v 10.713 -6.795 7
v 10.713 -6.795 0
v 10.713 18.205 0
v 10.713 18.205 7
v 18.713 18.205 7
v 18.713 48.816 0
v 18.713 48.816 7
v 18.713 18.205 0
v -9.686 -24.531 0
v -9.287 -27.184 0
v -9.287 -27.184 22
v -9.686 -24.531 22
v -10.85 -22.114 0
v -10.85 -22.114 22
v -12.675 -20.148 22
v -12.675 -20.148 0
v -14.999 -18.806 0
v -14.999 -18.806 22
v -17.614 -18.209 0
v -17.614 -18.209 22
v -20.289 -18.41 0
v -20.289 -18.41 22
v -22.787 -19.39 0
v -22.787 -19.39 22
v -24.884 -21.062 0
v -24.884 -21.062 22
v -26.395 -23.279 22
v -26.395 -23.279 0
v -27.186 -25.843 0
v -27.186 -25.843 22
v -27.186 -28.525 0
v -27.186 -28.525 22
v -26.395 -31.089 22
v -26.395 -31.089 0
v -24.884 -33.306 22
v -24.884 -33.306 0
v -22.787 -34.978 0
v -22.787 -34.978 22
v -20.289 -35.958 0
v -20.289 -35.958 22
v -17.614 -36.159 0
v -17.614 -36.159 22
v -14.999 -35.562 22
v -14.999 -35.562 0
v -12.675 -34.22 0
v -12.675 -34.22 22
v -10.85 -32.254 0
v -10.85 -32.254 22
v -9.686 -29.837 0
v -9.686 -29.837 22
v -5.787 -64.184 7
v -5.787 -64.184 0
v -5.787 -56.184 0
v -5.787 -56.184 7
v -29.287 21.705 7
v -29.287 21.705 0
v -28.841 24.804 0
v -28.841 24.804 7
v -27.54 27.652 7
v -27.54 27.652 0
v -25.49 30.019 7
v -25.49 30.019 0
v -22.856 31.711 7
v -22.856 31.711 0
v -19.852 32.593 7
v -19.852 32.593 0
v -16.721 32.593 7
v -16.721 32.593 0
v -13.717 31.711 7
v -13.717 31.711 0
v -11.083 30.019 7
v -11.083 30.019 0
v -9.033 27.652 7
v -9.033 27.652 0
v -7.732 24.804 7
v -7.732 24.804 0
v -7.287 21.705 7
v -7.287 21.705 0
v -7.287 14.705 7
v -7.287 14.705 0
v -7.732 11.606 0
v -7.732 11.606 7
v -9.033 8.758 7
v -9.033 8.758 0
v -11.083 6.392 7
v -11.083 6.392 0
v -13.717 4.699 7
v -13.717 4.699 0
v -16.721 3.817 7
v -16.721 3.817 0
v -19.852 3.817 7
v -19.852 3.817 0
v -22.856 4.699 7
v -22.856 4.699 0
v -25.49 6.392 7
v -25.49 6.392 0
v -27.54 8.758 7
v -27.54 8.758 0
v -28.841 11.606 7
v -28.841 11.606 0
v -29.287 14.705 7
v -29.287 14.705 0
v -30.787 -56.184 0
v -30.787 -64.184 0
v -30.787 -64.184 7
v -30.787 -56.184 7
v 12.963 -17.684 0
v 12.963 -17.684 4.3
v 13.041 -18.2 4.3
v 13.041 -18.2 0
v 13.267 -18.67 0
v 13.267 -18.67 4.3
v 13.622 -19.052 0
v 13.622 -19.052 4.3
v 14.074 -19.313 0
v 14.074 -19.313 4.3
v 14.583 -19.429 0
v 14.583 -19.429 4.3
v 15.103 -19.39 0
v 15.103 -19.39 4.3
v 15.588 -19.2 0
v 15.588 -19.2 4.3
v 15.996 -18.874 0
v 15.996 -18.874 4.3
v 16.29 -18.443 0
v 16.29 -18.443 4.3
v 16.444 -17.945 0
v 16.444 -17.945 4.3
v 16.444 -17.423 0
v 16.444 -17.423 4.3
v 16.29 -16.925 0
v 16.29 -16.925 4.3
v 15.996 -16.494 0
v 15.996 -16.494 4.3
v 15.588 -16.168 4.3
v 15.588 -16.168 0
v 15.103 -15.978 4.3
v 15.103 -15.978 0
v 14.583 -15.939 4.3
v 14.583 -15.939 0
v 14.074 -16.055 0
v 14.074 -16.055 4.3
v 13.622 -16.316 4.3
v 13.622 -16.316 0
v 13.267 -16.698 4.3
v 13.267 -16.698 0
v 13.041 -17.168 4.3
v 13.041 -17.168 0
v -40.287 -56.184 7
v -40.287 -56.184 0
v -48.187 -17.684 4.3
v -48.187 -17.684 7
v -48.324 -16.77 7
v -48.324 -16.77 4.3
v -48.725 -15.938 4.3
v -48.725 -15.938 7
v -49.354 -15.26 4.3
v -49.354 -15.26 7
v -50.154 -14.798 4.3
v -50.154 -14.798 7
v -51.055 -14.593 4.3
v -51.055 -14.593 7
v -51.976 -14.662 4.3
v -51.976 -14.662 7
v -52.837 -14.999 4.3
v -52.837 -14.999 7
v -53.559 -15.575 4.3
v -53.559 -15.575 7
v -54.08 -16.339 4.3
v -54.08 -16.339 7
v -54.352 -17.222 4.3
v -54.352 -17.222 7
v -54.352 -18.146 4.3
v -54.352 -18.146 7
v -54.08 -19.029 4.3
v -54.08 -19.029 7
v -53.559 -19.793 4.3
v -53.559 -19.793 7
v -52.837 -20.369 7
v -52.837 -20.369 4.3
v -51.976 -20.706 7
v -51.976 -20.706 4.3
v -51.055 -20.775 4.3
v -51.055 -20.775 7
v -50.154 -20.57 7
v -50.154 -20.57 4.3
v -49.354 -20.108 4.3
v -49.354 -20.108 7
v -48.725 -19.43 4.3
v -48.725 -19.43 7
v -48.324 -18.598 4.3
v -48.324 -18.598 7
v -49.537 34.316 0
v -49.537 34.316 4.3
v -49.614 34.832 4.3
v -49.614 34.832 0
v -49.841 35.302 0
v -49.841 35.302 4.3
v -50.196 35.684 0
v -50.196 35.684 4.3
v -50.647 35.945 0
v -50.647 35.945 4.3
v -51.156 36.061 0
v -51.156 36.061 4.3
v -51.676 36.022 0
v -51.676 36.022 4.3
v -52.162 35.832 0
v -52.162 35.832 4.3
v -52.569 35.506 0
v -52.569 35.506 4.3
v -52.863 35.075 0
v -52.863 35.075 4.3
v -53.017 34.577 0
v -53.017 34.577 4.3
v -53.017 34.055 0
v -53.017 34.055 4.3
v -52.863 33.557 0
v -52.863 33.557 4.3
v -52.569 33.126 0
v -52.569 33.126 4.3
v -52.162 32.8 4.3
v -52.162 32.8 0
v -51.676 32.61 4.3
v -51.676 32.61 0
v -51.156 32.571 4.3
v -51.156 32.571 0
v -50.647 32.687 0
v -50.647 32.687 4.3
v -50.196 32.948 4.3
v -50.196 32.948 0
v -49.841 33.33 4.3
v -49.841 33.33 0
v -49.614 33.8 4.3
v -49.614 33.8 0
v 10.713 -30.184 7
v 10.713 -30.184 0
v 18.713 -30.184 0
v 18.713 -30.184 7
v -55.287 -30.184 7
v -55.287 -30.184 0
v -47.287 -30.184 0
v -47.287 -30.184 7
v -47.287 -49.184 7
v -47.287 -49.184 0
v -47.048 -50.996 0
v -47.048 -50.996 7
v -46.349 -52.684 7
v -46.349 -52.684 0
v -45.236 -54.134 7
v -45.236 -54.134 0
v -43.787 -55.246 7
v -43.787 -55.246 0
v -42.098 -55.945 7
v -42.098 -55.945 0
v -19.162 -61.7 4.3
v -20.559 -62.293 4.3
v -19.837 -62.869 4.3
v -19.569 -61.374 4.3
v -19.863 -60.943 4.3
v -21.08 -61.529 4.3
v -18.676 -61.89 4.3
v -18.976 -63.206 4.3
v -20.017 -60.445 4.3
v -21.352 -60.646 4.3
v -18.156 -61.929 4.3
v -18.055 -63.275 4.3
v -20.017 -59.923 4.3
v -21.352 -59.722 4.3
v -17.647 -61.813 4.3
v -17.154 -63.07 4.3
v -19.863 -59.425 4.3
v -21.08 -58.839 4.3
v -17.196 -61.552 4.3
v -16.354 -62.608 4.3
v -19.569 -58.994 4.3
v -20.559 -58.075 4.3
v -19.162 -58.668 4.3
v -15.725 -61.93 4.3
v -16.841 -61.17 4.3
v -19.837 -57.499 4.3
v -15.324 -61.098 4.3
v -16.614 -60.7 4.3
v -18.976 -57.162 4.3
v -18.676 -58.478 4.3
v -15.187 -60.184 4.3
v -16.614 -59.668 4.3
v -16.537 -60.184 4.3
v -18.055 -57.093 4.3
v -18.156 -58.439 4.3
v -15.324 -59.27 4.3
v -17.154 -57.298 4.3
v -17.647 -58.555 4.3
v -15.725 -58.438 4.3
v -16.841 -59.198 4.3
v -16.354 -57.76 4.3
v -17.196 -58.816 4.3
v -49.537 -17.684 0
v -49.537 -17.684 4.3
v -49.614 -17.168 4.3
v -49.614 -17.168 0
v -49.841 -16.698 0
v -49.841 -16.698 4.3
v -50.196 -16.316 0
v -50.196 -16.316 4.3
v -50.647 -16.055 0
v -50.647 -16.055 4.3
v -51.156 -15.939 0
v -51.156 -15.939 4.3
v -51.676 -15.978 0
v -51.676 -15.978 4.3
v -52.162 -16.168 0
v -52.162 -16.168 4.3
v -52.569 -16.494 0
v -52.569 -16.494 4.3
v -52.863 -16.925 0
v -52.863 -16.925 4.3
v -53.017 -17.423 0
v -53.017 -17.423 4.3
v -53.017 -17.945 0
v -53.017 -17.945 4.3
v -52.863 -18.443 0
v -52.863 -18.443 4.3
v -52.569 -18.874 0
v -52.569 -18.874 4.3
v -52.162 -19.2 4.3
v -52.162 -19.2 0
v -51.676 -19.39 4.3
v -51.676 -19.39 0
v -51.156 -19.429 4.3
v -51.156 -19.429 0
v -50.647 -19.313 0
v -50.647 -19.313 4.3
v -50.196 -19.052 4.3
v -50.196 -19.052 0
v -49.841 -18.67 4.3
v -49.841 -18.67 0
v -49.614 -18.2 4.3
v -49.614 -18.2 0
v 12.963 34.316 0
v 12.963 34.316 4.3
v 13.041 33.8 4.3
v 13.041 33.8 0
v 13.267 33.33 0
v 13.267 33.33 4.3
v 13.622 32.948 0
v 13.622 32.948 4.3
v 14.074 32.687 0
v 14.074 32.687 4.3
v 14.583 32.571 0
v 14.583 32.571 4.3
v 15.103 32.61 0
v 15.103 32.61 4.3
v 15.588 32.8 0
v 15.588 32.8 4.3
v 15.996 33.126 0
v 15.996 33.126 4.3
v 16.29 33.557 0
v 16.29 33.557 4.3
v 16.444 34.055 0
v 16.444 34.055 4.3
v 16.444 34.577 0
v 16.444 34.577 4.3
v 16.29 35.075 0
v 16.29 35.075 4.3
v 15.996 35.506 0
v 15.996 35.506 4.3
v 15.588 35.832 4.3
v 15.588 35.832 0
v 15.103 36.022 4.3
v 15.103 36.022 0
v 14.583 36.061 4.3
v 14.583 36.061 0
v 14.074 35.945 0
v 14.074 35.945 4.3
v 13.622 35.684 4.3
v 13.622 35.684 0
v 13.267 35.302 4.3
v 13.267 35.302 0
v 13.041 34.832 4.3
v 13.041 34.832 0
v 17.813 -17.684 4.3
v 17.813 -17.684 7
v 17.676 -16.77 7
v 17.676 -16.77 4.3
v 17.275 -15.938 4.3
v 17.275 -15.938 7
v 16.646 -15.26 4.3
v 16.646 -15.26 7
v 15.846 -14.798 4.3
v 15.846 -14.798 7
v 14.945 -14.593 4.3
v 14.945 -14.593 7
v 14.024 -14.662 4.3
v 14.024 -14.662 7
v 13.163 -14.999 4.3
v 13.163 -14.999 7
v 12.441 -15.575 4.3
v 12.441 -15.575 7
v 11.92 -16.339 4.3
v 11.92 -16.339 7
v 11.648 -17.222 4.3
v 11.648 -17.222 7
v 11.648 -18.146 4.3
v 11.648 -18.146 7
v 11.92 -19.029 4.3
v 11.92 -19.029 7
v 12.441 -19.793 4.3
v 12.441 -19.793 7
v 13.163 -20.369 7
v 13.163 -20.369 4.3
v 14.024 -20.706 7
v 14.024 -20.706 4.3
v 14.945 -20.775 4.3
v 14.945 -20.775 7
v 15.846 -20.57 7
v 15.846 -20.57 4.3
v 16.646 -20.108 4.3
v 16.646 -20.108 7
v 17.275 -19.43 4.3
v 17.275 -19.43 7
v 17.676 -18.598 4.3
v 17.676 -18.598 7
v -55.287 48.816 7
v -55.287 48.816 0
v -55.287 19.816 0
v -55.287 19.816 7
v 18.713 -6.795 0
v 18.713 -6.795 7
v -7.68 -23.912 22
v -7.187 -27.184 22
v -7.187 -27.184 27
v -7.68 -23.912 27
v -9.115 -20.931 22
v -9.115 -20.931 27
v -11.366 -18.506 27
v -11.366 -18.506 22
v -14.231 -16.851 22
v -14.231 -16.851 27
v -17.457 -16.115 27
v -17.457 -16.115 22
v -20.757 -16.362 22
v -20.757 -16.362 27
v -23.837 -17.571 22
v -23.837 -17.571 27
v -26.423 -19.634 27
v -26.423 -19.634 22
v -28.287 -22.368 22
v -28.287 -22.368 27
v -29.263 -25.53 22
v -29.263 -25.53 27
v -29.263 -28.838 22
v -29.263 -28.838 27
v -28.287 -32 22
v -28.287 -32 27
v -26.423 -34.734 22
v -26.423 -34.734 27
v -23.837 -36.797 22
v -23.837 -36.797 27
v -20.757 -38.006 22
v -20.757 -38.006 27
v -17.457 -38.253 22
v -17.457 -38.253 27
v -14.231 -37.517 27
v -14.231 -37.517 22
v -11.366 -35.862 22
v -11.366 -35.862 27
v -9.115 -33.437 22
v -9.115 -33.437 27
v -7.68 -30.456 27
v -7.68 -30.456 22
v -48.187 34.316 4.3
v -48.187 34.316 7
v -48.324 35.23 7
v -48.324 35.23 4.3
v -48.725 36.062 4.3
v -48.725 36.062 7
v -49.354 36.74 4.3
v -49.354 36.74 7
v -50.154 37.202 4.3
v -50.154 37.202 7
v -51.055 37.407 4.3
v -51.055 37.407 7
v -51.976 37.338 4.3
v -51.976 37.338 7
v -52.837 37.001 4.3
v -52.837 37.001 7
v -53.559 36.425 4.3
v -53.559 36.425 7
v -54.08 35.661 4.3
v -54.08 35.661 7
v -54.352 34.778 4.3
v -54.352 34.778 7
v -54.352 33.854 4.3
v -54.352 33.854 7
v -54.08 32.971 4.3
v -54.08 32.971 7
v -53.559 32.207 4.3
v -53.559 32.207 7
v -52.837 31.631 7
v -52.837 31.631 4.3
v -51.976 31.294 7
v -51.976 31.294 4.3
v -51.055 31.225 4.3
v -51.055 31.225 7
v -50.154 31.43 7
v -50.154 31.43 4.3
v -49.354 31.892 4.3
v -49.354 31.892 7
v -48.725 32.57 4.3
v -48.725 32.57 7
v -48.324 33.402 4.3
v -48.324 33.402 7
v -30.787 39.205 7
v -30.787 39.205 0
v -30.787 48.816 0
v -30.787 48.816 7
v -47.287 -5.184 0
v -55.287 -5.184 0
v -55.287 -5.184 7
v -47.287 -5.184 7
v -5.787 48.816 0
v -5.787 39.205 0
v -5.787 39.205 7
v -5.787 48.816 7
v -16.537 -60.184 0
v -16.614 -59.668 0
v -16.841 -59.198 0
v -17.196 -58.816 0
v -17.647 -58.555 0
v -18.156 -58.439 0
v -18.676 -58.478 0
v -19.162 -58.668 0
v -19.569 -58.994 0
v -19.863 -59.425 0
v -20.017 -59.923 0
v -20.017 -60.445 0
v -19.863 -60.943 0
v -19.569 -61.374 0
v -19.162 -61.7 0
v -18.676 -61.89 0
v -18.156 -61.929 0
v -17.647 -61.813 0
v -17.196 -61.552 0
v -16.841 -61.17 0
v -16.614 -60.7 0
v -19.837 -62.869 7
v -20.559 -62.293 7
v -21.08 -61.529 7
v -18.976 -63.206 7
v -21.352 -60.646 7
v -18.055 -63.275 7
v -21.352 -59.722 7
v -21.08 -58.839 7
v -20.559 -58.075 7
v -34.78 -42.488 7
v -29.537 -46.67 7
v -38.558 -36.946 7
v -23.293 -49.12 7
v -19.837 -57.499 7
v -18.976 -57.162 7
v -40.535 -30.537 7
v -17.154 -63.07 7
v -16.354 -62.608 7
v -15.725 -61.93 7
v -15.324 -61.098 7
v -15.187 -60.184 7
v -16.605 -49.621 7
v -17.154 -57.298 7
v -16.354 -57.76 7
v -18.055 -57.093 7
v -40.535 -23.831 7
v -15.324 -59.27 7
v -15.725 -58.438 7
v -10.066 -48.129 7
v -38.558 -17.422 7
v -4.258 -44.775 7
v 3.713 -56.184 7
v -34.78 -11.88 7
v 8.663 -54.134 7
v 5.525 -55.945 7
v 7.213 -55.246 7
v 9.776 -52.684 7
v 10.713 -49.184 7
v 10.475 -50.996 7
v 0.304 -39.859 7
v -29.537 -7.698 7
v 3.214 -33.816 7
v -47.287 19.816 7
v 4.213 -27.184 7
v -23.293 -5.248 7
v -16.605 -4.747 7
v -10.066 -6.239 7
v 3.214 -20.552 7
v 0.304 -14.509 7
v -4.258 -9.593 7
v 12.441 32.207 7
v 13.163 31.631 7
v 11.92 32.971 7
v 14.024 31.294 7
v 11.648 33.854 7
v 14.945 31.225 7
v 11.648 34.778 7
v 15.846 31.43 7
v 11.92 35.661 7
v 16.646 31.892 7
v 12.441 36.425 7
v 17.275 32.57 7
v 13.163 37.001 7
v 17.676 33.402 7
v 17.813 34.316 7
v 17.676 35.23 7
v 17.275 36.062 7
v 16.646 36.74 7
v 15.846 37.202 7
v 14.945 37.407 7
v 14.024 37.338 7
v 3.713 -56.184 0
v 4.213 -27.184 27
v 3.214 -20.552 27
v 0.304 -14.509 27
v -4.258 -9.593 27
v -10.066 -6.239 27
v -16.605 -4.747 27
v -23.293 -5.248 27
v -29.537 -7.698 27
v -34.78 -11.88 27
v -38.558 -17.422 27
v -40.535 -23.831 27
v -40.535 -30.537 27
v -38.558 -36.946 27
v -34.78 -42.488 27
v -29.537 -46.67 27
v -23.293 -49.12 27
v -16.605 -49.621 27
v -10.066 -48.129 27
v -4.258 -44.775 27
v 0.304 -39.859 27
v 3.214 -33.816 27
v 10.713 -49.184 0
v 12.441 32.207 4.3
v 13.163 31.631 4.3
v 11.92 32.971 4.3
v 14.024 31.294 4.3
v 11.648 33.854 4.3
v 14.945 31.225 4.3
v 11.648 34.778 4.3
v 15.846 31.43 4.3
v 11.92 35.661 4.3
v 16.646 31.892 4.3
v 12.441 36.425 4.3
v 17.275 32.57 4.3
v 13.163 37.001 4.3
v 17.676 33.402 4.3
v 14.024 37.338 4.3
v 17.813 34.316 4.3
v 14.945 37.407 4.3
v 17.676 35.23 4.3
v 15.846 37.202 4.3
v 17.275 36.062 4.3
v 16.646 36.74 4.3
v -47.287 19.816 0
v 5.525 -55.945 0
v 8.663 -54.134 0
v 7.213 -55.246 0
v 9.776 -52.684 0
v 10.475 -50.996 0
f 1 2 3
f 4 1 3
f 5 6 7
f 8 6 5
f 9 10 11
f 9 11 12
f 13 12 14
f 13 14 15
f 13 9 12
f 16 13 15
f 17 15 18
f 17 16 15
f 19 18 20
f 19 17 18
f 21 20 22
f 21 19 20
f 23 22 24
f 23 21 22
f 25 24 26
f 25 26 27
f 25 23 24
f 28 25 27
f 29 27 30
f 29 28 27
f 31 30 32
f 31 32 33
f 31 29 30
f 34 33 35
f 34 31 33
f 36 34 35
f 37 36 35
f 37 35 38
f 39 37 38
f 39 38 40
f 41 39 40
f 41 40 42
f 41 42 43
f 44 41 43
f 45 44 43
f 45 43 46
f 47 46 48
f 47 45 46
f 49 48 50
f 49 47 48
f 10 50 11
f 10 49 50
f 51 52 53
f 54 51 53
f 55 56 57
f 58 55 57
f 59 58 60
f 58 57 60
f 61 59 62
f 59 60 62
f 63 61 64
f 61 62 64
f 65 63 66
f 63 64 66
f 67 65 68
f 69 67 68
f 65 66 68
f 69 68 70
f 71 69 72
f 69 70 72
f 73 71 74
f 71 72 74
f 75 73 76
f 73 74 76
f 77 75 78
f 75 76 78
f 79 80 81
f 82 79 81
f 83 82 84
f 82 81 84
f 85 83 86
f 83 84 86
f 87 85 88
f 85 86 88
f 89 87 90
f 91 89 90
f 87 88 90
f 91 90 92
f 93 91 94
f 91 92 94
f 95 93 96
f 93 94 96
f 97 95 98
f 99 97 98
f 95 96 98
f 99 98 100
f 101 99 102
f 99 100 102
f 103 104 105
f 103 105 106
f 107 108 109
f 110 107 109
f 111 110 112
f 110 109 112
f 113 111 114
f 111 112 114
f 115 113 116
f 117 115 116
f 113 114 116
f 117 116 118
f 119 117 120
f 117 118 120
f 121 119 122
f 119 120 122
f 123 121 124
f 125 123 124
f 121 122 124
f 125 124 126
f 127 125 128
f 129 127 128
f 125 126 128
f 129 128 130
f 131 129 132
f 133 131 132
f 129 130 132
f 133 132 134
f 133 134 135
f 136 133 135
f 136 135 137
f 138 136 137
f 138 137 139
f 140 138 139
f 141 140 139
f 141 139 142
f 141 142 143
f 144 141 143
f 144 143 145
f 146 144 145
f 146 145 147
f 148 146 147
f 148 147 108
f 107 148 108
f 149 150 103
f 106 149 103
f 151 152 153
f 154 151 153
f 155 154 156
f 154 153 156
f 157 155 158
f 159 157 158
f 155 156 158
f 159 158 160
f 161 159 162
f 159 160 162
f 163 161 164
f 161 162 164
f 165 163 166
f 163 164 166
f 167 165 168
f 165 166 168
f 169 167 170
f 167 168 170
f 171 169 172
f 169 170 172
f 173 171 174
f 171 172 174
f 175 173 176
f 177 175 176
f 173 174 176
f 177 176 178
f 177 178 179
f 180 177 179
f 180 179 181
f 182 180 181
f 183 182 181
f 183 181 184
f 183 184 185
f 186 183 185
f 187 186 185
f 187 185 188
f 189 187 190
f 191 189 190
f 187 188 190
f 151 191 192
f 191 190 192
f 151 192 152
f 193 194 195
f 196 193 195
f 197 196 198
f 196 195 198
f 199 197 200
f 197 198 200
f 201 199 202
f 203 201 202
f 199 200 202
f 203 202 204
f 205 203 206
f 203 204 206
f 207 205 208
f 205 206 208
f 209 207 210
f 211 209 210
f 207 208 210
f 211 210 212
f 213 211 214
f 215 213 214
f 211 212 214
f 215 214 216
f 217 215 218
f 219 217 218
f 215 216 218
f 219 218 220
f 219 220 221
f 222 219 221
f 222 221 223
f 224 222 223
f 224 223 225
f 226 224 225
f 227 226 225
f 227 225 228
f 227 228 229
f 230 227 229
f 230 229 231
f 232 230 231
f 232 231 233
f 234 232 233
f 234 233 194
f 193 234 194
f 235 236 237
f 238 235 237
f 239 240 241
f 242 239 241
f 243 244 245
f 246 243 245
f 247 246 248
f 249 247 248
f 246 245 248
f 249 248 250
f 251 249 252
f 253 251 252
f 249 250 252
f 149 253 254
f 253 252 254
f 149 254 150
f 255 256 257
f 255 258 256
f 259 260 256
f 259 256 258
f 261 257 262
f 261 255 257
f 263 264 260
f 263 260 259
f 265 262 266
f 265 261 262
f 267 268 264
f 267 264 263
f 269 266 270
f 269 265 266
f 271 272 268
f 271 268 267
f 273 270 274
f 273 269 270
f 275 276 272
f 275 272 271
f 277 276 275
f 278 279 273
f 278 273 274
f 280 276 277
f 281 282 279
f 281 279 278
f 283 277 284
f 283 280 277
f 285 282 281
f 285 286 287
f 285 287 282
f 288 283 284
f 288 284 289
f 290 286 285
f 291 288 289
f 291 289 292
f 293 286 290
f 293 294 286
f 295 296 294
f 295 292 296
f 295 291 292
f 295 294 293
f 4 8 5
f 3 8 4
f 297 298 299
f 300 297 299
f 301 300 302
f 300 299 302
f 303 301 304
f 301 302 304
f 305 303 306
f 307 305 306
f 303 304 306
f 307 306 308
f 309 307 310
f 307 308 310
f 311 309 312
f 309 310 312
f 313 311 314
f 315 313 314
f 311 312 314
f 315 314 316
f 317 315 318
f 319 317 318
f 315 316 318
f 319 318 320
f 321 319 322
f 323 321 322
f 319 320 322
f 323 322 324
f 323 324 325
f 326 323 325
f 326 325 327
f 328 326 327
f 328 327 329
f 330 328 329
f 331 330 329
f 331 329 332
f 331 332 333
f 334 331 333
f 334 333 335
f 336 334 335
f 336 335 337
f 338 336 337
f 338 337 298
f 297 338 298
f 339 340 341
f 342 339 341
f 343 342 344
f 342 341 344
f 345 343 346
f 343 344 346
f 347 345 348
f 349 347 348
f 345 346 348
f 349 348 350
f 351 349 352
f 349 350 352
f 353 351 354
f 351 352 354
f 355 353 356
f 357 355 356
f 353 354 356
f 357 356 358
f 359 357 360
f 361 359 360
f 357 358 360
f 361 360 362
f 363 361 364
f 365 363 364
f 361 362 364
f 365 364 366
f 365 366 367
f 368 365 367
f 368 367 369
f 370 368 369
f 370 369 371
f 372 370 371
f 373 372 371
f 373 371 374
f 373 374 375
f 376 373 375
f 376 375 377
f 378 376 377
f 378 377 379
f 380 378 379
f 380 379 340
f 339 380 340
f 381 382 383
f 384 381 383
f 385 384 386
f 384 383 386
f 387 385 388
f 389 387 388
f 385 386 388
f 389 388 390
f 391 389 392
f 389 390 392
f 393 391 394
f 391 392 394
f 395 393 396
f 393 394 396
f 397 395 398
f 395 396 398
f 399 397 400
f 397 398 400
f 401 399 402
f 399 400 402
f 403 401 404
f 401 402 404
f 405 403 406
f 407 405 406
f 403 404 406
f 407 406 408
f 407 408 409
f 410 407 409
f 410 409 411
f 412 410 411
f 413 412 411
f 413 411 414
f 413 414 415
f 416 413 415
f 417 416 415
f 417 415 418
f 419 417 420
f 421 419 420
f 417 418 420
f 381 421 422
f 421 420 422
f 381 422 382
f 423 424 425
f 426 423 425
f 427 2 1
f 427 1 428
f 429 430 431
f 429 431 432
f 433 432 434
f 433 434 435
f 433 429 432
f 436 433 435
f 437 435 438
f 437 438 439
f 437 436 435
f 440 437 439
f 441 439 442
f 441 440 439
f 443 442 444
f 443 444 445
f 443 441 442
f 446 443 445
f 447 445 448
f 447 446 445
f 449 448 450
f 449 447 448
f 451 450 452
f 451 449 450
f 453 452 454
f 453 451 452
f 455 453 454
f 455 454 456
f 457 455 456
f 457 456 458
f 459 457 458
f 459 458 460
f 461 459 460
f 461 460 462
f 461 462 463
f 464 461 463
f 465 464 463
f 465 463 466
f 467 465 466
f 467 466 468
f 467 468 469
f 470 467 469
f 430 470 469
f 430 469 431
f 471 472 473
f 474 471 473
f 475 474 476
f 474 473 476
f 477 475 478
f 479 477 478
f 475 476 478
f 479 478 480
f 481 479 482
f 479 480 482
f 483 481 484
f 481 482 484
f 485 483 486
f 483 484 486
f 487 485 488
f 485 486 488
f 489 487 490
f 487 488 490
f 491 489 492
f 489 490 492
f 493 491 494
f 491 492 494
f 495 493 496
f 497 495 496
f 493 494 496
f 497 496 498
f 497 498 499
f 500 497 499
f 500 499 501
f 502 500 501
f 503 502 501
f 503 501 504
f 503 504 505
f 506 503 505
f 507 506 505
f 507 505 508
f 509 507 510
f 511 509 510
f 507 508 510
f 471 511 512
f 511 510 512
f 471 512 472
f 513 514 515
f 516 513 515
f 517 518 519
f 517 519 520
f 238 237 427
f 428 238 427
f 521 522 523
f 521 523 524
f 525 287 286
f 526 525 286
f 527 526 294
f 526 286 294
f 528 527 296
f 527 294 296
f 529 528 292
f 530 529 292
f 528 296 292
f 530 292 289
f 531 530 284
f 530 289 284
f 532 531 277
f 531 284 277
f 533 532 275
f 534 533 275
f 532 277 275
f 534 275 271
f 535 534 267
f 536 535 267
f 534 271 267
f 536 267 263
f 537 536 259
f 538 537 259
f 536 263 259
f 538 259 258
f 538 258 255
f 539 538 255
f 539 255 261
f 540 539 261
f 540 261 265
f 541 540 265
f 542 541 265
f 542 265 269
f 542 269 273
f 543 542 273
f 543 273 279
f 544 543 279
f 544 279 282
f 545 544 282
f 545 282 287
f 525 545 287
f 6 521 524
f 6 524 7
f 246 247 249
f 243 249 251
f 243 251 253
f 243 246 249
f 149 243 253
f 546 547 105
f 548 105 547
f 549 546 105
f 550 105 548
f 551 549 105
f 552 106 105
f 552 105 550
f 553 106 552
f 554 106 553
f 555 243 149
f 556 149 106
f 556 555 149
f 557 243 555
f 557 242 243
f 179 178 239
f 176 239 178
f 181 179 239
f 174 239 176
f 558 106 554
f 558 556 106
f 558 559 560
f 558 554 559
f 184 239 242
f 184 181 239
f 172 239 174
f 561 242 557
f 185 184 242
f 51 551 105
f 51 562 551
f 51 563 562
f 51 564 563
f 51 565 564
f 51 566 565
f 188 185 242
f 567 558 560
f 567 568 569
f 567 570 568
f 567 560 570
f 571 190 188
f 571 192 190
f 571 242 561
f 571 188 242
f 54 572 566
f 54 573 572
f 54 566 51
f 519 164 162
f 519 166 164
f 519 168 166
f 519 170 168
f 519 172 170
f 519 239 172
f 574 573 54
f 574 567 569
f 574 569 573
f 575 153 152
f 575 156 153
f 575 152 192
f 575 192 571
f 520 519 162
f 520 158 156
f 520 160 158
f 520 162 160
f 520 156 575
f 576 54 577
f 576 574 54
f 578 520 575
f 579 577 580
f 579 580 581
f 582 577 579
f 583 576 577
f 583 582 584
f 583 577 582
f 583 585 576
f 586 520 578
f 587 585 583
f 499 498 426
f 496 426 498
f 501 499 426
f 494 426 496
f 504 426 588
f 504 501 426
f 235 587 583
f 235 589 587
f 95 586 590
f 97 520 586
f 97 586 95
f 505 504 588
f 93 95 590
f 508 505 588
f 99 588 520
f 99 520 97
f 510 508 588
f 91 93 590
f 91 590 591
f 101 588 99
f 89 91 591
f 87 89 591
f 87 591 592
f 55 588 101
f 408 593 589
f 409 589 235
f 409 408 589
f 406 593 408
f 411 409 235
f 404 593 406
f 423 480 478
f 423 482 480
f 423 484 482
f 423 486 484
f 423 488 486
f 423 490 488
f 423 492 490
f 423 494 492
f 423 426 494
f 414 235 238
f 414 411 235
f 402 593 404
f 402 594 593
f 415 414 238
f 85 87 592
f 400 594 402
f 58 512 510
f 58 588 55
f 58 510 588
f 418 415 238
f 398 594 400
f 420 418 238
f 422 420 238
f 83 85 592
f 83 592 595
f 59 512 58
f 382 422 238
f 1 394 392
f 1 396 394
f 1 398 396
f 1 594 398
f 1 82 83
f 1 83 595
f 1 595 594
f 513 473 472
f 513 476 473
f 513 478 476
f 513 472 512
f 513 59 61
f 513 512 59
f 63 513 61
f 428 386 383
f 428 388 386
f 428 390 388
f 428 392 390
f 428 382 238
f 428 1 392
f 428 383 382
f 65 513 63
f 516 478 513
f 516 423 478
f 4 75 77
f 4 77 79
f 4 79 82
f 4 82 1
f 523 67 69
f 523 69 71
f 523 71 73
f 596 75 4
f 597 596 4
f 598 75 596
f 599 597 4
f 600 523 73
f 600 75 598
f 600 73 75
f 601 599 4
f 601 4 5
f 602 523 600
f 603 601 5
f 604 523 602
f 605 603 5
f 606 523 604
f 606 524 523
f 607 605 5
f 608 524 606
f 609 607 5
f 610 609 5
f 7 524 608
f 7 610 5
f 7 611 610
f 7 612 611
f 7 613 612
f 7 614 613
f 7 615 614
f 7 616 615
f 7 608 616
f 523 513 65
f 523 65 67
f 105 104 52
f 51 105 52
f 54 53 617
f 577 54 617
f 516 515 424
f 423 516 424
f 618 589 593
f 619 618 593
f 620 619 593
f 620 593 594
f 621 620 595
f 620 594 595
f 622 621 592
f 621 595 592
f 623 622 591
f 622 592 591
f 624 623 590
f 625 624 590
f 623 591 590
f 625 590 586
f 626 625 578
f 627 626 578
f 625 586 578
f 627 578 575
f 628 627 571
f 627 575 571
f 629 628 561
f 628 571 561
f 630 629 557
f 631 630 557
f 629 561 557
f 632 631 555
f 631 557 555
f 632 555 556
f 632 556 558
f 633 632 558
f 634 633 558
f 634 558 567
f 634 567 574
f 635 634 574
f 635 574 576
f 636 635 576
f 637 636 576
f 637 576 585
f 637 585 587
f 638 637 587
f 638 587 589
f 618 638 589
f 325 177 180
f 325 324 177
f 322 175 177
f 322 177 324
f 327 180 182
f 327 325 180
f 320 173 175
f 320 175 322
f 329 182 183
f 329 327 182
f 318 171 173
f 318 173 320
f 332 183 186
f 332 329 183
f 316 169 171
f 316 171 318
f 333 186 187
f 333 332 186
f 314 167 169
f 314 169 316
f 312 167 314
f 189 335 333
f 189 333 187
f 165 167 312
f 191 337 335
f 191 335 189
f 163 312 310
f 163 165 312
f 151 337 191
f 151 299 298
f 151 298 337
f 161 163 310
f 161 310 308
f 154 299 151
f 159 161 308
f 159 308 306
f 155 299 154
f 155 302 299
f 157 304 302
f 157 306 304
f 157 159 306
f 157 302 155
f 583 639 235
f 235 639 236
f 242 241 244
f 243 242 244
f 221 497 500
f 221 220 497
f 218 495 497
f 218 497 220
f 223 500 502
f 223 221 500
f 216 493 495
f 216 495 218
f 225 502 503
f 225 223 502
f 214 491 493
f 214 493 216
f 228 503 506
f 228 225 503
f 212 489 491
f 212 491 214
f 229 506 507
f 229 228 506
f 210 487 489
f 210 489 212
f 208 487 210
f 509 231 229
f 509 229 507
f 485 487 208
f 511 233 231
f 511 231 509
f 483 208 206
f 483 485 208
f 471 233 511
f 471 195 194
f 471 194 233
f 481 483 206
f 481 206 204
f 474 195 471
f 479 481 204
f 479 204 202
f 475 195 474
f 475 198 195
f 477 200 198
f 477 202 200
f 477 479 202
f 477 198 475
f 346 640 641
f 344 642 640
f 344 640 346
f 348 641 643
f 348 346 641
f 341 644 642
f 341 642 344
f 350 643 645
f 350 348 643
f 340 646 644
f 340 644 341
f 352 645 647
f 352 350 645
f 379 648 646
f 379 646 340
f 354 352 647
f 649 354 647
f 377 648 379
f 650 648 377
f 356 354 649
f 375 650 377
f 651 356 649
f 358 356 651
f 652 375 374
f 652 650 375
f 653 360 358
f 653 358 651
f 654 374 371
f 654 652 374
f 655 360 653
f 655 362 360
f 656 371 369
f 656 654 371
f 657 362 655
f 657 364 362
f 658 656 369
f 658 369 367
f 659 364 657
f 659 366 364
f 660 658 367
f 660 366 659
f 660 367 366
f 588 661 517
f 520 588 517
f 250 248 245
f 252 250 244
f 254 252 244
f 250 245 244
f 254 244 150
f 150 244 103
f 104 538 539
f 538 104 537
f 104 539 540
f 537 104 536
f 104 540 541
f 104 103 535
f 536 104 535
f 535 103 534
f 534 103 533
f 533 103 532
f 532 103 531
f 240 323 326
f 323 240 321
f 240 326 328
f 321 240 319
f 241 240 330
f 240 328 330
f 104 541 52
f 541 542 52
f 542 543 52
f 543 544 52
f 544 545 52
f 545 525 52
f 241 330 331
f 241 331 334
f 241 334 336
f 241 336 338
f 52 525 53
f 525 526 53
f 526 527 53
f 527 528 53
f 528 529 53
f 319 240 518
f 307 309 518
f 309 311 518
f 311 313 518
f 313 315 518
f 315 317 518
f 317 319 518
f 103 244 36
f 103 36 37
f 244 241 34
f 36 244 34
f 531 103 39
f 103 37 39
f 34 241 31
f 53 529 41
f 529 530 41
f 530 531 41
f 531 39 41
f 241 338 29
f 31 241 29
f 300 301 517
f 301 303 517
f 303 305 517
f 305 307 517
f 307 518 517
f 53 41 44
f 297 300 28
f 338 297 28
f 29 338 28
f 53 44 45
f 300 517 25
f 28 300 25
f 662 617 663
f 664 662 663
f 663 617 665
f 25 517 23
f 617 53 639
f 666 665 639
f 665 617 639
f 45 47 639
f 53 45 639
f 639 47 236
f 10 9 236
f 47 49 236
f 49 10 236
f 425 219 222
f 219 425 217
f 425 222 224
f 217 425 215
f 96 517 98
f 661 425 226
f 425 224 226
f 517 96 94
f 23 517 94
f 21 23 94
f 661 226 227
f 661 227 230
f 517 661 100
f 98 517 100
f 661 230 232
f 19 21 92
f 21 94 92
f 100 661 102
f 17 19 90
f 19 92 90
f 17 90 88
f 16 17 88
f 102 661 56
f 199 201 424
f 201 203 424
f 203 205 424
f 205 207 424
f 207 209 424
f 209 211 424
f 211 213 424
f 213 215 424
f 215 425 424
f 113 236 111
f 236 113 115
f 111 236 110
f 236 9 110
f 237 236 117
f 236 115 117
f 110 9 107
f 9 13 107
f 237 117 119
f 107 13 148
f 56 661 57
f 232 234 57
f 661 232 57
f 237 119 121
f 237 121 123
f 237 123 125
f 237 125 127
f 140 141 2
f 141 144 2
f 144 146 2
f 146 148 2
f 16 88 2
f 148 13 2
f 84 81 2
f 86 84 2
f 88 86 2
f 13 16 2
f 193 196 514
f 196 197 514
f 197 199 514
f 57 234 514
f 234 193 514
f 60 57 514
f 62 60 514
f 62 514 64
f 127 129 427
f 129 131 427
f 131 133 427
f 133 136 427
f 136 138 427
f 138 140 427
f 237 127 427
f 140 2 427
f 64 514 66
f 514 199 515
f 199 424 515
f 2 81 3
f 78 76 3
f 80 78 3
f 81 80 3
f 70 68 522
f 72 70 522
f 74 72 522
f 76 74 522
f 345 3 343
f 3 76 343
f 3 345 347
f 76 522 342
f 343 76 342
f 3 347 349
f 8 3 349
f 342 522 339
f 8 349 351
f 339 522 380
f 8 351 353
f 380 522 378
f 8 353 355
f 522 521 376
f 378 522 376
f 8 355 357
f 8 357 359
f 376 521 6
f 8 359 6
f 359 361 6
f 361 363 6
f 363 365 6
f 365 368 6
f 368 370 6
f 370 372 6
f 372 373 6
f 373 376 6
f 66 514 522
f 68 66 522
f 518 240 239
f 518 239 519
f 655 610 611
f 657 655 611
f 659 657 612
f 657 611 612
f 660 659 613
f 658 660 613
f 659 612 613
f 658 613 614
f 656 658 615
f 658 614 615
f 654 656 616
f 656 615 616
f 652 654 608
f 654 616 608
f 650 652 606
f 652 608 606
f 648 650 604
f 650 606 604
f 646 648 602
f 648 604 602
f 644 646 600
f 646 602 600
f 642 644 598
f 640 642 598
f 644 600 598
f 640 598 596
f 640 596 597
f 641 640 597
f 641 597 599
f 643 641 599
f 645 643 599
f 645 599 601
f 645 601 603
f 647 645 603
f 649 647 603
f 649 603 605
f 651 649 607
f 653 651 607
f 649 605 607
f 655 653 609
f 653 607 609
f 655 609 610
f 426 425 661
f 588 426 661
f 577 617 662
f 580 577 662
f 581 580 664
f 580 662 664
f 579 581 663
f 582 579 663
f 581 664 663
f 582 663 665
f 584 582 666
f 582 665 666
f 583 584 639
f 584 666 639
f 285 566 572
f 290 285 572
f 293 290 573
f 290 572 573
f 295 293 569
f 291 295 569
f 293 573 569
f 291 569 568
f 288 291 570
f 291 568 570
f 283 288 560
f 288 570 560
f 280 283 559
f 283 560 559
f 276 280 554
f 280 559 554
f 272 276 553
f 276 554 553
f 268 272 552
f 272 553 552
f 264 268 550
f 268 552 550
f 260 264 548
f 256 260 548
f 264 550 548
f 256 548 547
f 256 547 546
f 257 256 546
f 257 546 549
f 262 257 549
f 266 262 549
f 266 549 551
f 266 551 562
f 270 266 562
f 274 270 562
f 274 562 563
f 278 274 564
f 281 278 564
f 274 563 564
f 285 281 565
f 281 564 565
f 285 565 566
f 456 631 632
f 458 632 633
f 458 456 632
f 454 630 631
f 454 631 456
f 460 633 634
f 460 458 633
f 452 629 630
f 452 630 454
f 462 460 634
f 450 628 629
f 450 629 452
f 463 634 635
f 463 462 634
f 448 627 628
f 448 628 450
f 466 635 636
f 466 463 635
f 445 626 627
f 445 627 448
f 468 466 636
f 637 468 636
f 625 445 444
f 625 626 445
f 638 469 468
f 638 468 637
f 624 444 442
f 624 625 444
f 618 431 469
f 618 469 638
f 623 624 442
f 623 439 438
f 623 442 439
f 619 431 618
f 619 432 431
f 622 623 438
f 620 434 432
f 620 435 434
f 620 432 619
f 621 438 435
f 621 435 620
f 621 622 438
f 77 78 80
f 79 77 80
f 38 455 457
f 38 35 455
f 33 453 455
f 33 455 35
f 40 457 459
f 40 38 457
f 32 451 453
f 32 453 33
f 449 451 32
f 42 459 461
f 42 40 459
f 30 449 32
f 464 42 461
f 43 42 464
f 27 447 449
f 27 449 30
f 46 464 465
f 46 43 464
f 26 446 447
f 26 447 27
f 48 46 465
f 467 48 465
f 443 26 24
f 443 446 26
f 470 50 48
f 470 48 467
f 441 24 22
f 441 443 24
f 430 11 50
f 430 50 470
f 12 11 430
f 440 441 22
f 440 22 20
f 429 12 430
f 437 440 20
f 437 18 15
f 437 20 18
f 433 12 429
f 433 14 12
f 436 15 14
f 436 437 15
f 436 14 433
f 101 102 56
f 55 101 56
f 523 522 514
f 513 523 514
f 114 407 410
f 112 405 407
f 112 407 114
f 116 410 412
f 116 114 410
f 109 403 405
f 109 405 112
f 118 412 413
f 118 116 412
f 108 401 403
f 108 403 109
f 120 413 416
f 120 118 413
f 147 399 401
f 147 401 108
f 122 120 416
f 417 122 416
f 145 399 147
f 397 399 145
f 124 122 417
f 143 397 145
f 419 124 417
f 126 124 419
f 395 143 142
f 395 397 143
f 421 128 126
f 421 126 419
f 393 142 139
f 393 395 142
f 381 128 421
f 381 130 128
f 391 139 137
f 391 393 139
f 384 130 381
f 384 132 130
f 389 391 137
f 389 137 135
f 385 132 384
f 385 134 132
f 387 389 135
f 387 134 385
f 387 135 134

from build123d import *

# Parameters (mm, degrees)
CROQUIS2_R              = 22.5
SALIENTE_EXTRUIR1_DEPTH = 7
CROQUIS2_4_R            = 11.1
CROQUIS2_4_R_2          = 9
SALIENTE_EXTRUIR2_DEPTH = 22
CROQUIS2_5_R            = 22.5
CROQUIS2_5_R_2          = 11.1
SALIENTE_EXTRUIR3_DEPTH = 27
CROQUIS3_R              = 1.75
CORTAR_EXTRUIR1_DEPTH   = 7
CROQUIS4_R              = 3.1
CORTAR_EXTRUIR2_DEPTH   = 2.7


with BuildPart() as part:
    # Croquis2 → Saliente-Extruir1 (new body)
    with BuildSketch(Plane.XY):
        with BuildLine():
            Line((-30.786620614, 39.205288522), (-30.786620614, 48.816010109))
            Line((-30.786620614, 48.816010109), (-55.286620614, 48.816010109))
            Line((-55.286620614, 48.816010109), (-55.286620614, 19.816010109))
            Line((-55.286620614, 19.816010109), (-47.286620614, 19.816010109))
            Line((-47.286620614, 19.816010109), (-47.286620614, -5.183989891))
            Line((-47.286620614, -5.183989891), (-55.286620614, -5.183989891))
            Line((-55.286620614, -5.183989891), (-55.286620614, -30.183989891))
            Line((-55.286620614, -30.183989891), (-47.286620614, -30.183989891))
            Line((-47.286620614, -30.183989891), (-47.286620614, -49.183989891))
            ThreePointArc((-47.286620614, -49.183989891), (-45.236368082, -54.133737359), (-40.286620614, -56.183989891))
            Line((-40.286620614, -56.183989891), (-30.786620614, -56.183989891))
            Line((-30.786620614, -56.183989891), (-30.786620614, -64.183989891))
            Line((-30.786620614, -64.183989891), (-5.786620614, -64.183989891))
            Line((-5.786620614, -64.183989891), (-5.786620614, -56.183989891))
            Line((-5.786620614, -56.183989891), (3.713379386, -56.183989891))
            ThreePointArc((3.713379386, -56.183989891), (8.663126854, -54.133737359), (10.713379386, -49.183989891))
            Line((10.713379386, -49.183989891), (10.713379386, -30.183989891))
            Line((10.713379386, -30.183989891), (18.713379386, -30.183989891))
            Line((18.713379386, -30.183989891), (18.713379386, -6.794711478))
            Line((18.713379386, -6.794711478), (10.713379386, -6.794711478))
            Line((10.713379386, -6.794711478), (10.713379386, 18.205288522))
            Line((10.713379386, 18.205288522), (18.713379386, 18.205288522))
            Line((18.713379386, 18.205288522), (18.713379386, 48.816010109))
            Line((18.713379386, 48.816010109), (-5.786620614, 48.816010109))
            Line((-5.786620614, 48.816010109), (-5.786620614, 39.205288522))
            Line((-5.786620614, 39.205288522), (-30.786620614, 39.205288522))
        make_face()
        with BuildLine():
            ThreePointArc((-7.286620614, 14.705288522), (-18.286620614, 3.705288522), (-29.286620614, 14.705288522))
            Line((-29.286620614, 14.705288522), (-29.286620614, 21.705288522))
            ThreePointArc((-29.286620614, 21.705288522), (-18.286620614, 32.705288522), (-7.286620614, 21.705288522))
            Line((-7.286620614, 21.705288522), (-7.286620614, 14.705288522))
        make_face(mode=Mode.SUBTRACT)
        with Locations((-18.286620614, -27.183989891)):
            Circle(CROQUIS2_R, mode=Mode.SUBTRACT)
    extrude(amount=SALIENTE_EXTRUIR1_DEPTH)



with BuildPart() as body_2:
    # Croquis2<4> → Saliente-Extruir2 (new body)
    with BuildSketch(Plane.XY):
        with Locations((-18.286620614, -27.183989891)):
            Circle(CROQUIS2_4_R)
        with Locations((-18.286620614, -27.183989891)):
            Circle(CROQUIS2_4_R_2, mode=Mode.SUBTRACT)
    extrude(amount=SALIENTE_EXTRUIR2_DEPTH)


with BuildPart() as part_1:
    add(part.part)

    add(body_2.part)  # Saliente-Extruir3 merges body 2
    # Croquis2<5> → Saliente-Extruir3 (add)
    with BuildSketch(Plane.XY):
        with Locations((-18.286620614, -27.183989891)):
            Circle(CROQUIS2_5_R)
        with Locations((-18.286620614, -27.183989891)):
            Circle(CROQUIS2_5_R_2, mode=Mode.SUBTRACT)
    extrude(amount=SALIENTE_EXTRUIR3_DEPTH)

    # Croquis3 → Cortar-Extruir1 (cut)
    with BuildSketch(Plane.XY.offset(7)):
        with Locations((-51.286620614, 34.316010109)):
            Circle(CROQUIS3_R)
        with Locations((-51.286620614, -17.683989891)):
            Circle(CROQUIS3_R)
        with Locations((-18.286620614, -60.183989891)):
            Circle(CROQUIS3_R)
        with Locations((14.713379386, -17.683989891)):
            Circle(CROQUIS3_R)
        with Locations((14.713379386, 34.316010109)):
            Circle(CROQUIS3_R)
    extrude(amount=-CORTAR_EXTRUIR1_DEPTH, mode=Mode.SUBTRACT)

    # Croquis4 → Cortar-Extruir2 (cut)
    with BuildSketch(Plane.XY.offset(7)):
        with Locations((-51.286620614, -17.683989891)):
            Circle(CROQUIS4_R)
        with Locations((-51.286620614, 34.316010109)):
            Circle(CROQUIS4_R)
        with Locations((14.713379386, 34.316010109)):
            Circle(CROQUIS4_R)
        with Locations((14.713379386, -17.683989891)):
            Circle(CROQUIS4_R)
        with Locations((-18.286620614, -60.183989891)):
            Circle(CROQUIS4_R)
    extrude(amount=-CORTAR_EXTRUIR2_DEPTH, mode=Mode.SUBTRACT)


solid = part_1.part
